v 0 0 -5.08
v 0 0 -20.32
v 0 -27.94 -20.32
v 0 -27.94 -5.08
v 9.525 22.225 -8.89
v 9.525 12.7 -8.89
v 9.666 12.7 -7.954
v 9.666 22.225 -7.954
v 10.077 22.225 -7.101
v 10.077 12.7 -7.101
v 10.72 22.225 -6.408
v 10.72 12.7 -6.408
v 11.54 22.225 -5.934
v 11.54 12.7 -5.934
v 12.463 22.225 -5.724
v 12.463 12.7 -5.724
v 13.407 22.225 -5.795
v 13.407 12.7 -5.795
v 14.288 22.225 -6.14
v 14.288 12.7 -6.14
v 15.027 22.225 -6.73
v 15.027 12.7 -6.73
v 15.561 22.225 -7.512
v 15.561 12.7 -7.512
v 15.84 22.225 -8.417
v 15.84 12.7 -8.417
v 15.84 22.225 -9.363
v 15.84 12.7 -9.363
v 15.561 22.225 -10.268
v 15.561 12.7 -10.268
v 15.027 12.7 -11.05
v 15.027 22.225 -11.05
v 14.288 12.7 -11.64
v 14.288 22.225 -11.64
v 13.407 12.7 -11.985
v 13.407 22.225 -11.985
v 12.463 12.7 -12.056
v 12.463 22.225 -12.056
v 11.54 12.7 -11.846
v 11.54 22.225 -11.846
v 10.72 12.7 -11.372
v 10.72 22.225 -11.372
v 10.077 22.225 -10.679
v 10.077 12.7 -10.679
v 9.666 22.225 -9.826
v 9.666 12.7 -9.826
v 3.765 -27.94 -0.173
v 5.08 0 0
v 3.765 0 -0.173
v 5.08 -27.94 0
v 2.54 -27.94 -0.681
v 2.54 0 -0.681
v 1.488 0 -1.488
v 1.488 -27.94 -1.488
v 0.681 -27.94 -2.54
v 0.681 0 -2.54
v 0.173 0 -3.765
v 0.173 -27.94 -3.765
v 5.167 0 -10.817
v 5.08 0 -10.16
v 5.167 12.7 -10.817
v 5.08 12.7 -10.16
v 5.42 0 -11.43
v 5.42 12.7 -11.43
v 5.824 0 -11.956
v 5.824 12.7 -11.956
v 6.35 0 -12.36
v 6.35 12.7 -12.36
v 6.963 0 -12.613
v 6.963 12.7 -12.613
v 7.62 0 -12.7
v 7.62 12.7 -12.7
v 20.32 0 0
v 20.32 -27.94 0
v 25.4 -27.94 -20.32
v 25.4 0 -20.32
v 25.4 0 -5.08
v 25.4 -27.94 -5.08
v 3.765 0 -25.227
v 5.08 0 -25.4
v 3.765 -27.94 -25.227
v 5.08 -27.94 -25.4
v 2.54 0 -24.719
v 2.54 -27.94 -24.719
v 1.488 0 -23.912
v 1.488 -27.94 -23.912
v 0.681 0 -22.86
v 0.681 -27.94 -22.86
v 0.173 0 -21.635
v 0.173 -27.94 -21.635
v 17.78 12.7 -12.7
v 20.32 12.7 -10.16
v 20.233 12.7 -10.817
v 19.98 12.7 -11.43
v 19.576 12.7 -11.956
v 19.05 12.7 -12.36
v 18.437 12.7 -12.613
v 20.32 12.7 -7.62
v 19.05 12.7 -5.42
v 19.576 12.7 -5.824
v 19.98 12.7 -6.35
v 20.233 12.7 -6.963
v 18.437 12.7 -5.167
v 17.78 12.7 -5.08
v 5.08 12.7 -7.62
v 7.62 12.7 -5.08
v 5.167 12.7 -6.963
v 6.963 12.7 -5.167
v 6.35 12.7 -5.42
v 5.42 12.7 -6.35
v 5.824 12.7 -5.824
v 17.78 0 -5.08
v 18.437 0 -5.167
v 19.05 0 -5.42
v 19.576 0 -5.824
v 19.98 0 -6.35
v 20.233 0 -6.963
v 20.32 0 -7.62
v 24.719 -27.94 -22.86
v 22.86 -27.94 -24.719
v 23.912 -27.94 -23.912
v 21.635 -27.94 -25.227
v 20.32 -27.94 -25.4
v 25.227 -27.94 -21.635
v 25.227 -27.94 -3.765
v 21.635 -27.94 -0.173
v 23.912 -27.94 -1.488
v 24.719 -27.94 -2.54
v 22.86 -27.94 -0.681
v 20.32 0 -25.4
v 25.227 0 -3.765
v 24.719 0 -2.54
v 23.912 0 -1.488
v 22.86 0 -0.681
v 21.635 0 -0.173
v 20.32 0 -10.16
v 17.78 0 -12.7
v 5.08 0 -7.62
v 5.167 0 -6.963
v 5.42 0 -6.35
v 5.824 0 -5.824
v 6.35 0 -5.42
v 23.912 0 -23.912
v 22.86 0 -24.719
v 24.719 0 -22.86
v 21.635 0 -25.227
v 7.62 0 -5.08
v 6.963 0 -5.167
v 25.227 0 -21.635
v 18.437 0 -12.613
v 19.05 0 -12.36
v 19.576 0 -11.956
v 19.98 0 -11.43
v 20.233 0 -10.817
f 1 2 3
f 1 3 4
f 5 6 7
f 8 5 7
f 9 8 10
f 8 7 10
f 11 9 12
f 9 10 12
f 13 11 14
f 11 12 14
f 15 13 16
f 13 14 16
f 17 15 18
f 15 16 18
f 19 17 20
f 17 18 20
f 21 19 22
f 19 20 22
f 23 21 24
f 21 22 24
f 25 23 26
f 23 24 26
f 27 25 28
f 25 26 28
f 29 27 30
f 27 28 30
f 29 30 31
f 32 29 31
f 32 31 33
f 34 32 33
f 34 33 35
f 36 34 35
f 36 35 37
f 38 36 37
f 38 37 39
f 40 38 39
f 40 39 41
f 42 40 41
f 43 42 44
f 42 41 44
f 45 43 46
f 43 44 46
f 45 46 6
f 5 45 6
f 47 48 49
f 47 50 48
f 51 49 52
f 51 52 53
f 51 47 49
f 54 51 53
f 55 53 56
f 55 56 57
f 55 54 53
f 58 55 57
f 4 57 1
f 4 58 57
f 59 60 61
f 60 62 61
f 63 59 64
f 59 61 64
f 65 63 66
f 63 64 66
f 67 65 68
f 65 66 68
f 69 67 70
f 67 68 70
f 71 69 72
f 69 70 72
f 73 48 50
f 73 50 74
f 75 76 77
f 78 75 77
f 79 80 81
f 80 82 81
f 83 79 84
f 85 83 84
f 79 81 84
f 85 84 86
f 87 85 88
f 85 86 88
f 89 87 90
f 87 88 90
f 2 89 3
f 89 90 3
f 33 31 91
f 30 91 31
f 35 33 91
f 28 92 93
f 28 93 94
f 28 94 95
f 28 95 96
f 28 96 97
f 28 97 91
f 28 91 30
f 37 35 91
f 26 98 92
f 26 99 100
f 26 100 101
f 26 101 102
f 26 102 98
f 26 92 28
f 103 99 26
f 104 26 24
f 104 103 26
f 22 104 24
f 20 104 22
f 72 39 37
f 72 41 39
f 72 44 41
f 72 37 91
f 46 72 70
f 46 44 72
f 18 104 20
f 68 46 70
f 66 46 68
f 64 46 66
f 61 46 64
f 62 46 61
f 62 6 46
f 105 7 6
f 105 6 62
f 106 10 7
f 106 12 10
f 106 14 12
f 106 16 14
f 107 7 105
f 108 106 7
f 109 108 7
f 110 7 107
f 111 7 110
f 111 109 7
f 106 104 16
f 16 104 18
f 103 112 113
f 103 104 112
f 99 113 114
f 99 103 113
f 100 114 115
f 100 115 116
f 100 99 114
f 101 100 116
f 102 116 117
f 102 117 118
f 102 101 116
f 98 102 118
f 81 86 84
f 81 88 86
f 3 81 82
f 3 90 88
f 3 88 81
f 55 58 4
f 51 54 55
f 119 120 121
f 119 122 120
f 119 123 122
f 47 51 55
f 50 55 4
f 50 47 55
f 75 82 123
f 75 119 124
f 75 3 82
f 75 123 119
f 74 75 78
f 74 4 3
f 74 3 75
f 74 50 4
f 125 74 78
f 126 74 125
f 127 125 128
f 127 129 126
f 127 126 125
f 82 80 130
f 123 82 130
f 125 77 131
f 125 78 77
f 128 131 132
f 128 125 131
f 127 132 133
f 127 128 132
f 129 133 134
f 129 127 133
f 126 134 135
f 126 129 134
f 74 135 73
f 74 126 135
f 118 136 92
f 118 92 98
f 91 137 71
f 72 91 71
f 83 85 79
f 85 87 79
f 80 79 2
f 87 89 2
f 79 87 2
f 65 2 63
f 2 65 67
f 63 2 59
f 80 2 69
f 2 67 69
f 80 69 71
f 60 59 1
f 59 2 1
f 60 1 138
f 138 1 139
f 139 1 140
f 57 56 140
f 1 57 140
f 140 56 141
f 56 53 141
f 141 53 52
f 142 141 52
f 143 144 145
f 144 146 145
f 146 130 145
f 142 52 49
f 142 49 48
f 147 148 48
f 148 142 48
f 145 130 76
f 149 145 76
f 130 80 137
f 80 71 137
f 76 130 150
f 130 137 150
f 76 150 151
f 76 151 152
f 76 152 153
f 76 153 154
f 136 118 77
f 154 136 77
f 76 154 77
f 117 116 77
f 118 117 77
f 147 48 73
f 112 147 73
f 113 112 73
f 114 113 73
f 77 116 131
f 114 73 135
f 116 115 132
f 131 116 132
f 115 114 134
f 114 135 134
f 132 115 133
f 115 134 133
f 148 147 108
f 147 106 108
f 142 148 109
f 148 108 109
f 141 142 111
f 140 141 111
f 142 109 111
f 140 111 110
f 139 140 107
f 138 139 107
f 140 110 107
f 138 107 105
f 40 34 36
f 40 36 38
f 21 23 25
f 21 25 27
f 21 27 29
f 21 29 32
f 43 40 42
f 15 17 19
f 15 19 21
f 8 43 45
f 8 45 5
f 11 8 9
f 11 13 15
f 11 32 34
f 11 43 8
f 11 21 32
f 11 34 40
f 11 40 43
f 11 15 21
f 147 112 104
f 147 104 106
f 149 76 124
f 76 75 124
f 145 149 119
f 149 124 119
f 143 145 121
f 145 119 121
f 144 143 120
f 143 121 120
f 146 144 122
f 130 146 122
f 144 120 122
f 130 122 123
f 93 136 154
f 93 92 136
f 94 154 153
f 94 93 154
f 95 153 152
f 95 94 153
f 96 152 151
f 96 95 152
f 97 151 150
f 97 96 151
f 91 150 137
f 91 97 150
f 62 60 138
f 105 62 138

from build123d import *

# Parameters (mm, degrees)
F0_W      = 25.4
F0_H      = 25.4
F1_DEPTH  = 27.94
F2_R      = 5.08
F3_R      = 5.08
F4_R      = 5.08
F5_R      = 5.08
F6_W      = 15.24
F6_H      = 7.62
F7_DEPTH  = 12.7
F8_R      = 2.54
F9_R      = 2.54
F10_R     = 2.54
F11_R     = 2.54
F12_R     = 3.175
F14_DEPTH = 9.525


with BuildPart() as f1:
    # F0 (on Front) → F1 (new body)
    with BuildSketch(Plane.XZ):
        with Locations((12.7, -12.7)):
            Rectangle(F0_W, F0_H)
    extrude(amount=F1_DEPTH)

    # F2
    f2_edges = [f1.edges().sort_by_distance(p)[0] for p in [
        (25.4, -13.97, 0),
    ]]
    fillet(f2_edges, radius=F2_R)

    # F3
    f3_edges = [f1.edges().sort_by_distance(p)[0] for p in [
        (0, -13.97, 0),
    ]]
    fillet(f3_edges, radius=F3_R)

    # F4
    f4_edges = [f1.edges().sort_by_distance(p)[0] for p in [
        (25.4, -13.97, -25.4),
    ]]
    fillet(f4_edges, radius=F4_R)

    # F5
    f5_edges = [f1.edges().sort_by_distance(p)[0] for p in [
        (0, -13.97, -25.4),
    ]]
    fillet(f5_edges, radius=F5_R)

    # F6 (on face) → F7 (join)
    with BuildSketch(Plane(origin=(0, 0, 0), x_dir=(-1, 0, 0), z_dir=(0, 1, 0))):
        with Locations((-12.7, -8.89)):
            Rectangle(F6_W, F6_H)
    extrude(amount=F7_DEPTH)

    # F8
    f8_edges = [f1.edges().sort_by_distance(p)[0] for p in [
        (5.08, 6.35, -5.08),
    ]]
    fillet(f8_edges, radius=F8_R)

    # F9
    f9_edges = [f1.edges().sort_by_distance(p)[0] for p in [
        (5.08, 6.35, -12.7),
    ]]
    fillet(f9_edges, radius=F9_R)

    # F10
    f10_edges = [f1.edges().sort_by_distance(p)[0] for p in [
        (20.32, 6.35, -5.08),
    ]]
    fillet(f10_edges, radius=F10_R)

    # F11
    f11_edges = [f1.edges().sort_by_distance(p)[0] for p in [
        (20.32, 6.35, -12.7),
    ]]
    fillet(f11_edges, radius=F11_R)

    # F12 (on face) → F14 (join)
    with BuildSketch(Plane(origin=(0, 12.7, 0), x_dir=(-1, 0, 0), z_dir=(0, 1, 0))):
        with Locations((-12.7, -8.89)):
            Circle(F12_R)
    extrude(amount=F14_DEPTH)


solid = f1.part
